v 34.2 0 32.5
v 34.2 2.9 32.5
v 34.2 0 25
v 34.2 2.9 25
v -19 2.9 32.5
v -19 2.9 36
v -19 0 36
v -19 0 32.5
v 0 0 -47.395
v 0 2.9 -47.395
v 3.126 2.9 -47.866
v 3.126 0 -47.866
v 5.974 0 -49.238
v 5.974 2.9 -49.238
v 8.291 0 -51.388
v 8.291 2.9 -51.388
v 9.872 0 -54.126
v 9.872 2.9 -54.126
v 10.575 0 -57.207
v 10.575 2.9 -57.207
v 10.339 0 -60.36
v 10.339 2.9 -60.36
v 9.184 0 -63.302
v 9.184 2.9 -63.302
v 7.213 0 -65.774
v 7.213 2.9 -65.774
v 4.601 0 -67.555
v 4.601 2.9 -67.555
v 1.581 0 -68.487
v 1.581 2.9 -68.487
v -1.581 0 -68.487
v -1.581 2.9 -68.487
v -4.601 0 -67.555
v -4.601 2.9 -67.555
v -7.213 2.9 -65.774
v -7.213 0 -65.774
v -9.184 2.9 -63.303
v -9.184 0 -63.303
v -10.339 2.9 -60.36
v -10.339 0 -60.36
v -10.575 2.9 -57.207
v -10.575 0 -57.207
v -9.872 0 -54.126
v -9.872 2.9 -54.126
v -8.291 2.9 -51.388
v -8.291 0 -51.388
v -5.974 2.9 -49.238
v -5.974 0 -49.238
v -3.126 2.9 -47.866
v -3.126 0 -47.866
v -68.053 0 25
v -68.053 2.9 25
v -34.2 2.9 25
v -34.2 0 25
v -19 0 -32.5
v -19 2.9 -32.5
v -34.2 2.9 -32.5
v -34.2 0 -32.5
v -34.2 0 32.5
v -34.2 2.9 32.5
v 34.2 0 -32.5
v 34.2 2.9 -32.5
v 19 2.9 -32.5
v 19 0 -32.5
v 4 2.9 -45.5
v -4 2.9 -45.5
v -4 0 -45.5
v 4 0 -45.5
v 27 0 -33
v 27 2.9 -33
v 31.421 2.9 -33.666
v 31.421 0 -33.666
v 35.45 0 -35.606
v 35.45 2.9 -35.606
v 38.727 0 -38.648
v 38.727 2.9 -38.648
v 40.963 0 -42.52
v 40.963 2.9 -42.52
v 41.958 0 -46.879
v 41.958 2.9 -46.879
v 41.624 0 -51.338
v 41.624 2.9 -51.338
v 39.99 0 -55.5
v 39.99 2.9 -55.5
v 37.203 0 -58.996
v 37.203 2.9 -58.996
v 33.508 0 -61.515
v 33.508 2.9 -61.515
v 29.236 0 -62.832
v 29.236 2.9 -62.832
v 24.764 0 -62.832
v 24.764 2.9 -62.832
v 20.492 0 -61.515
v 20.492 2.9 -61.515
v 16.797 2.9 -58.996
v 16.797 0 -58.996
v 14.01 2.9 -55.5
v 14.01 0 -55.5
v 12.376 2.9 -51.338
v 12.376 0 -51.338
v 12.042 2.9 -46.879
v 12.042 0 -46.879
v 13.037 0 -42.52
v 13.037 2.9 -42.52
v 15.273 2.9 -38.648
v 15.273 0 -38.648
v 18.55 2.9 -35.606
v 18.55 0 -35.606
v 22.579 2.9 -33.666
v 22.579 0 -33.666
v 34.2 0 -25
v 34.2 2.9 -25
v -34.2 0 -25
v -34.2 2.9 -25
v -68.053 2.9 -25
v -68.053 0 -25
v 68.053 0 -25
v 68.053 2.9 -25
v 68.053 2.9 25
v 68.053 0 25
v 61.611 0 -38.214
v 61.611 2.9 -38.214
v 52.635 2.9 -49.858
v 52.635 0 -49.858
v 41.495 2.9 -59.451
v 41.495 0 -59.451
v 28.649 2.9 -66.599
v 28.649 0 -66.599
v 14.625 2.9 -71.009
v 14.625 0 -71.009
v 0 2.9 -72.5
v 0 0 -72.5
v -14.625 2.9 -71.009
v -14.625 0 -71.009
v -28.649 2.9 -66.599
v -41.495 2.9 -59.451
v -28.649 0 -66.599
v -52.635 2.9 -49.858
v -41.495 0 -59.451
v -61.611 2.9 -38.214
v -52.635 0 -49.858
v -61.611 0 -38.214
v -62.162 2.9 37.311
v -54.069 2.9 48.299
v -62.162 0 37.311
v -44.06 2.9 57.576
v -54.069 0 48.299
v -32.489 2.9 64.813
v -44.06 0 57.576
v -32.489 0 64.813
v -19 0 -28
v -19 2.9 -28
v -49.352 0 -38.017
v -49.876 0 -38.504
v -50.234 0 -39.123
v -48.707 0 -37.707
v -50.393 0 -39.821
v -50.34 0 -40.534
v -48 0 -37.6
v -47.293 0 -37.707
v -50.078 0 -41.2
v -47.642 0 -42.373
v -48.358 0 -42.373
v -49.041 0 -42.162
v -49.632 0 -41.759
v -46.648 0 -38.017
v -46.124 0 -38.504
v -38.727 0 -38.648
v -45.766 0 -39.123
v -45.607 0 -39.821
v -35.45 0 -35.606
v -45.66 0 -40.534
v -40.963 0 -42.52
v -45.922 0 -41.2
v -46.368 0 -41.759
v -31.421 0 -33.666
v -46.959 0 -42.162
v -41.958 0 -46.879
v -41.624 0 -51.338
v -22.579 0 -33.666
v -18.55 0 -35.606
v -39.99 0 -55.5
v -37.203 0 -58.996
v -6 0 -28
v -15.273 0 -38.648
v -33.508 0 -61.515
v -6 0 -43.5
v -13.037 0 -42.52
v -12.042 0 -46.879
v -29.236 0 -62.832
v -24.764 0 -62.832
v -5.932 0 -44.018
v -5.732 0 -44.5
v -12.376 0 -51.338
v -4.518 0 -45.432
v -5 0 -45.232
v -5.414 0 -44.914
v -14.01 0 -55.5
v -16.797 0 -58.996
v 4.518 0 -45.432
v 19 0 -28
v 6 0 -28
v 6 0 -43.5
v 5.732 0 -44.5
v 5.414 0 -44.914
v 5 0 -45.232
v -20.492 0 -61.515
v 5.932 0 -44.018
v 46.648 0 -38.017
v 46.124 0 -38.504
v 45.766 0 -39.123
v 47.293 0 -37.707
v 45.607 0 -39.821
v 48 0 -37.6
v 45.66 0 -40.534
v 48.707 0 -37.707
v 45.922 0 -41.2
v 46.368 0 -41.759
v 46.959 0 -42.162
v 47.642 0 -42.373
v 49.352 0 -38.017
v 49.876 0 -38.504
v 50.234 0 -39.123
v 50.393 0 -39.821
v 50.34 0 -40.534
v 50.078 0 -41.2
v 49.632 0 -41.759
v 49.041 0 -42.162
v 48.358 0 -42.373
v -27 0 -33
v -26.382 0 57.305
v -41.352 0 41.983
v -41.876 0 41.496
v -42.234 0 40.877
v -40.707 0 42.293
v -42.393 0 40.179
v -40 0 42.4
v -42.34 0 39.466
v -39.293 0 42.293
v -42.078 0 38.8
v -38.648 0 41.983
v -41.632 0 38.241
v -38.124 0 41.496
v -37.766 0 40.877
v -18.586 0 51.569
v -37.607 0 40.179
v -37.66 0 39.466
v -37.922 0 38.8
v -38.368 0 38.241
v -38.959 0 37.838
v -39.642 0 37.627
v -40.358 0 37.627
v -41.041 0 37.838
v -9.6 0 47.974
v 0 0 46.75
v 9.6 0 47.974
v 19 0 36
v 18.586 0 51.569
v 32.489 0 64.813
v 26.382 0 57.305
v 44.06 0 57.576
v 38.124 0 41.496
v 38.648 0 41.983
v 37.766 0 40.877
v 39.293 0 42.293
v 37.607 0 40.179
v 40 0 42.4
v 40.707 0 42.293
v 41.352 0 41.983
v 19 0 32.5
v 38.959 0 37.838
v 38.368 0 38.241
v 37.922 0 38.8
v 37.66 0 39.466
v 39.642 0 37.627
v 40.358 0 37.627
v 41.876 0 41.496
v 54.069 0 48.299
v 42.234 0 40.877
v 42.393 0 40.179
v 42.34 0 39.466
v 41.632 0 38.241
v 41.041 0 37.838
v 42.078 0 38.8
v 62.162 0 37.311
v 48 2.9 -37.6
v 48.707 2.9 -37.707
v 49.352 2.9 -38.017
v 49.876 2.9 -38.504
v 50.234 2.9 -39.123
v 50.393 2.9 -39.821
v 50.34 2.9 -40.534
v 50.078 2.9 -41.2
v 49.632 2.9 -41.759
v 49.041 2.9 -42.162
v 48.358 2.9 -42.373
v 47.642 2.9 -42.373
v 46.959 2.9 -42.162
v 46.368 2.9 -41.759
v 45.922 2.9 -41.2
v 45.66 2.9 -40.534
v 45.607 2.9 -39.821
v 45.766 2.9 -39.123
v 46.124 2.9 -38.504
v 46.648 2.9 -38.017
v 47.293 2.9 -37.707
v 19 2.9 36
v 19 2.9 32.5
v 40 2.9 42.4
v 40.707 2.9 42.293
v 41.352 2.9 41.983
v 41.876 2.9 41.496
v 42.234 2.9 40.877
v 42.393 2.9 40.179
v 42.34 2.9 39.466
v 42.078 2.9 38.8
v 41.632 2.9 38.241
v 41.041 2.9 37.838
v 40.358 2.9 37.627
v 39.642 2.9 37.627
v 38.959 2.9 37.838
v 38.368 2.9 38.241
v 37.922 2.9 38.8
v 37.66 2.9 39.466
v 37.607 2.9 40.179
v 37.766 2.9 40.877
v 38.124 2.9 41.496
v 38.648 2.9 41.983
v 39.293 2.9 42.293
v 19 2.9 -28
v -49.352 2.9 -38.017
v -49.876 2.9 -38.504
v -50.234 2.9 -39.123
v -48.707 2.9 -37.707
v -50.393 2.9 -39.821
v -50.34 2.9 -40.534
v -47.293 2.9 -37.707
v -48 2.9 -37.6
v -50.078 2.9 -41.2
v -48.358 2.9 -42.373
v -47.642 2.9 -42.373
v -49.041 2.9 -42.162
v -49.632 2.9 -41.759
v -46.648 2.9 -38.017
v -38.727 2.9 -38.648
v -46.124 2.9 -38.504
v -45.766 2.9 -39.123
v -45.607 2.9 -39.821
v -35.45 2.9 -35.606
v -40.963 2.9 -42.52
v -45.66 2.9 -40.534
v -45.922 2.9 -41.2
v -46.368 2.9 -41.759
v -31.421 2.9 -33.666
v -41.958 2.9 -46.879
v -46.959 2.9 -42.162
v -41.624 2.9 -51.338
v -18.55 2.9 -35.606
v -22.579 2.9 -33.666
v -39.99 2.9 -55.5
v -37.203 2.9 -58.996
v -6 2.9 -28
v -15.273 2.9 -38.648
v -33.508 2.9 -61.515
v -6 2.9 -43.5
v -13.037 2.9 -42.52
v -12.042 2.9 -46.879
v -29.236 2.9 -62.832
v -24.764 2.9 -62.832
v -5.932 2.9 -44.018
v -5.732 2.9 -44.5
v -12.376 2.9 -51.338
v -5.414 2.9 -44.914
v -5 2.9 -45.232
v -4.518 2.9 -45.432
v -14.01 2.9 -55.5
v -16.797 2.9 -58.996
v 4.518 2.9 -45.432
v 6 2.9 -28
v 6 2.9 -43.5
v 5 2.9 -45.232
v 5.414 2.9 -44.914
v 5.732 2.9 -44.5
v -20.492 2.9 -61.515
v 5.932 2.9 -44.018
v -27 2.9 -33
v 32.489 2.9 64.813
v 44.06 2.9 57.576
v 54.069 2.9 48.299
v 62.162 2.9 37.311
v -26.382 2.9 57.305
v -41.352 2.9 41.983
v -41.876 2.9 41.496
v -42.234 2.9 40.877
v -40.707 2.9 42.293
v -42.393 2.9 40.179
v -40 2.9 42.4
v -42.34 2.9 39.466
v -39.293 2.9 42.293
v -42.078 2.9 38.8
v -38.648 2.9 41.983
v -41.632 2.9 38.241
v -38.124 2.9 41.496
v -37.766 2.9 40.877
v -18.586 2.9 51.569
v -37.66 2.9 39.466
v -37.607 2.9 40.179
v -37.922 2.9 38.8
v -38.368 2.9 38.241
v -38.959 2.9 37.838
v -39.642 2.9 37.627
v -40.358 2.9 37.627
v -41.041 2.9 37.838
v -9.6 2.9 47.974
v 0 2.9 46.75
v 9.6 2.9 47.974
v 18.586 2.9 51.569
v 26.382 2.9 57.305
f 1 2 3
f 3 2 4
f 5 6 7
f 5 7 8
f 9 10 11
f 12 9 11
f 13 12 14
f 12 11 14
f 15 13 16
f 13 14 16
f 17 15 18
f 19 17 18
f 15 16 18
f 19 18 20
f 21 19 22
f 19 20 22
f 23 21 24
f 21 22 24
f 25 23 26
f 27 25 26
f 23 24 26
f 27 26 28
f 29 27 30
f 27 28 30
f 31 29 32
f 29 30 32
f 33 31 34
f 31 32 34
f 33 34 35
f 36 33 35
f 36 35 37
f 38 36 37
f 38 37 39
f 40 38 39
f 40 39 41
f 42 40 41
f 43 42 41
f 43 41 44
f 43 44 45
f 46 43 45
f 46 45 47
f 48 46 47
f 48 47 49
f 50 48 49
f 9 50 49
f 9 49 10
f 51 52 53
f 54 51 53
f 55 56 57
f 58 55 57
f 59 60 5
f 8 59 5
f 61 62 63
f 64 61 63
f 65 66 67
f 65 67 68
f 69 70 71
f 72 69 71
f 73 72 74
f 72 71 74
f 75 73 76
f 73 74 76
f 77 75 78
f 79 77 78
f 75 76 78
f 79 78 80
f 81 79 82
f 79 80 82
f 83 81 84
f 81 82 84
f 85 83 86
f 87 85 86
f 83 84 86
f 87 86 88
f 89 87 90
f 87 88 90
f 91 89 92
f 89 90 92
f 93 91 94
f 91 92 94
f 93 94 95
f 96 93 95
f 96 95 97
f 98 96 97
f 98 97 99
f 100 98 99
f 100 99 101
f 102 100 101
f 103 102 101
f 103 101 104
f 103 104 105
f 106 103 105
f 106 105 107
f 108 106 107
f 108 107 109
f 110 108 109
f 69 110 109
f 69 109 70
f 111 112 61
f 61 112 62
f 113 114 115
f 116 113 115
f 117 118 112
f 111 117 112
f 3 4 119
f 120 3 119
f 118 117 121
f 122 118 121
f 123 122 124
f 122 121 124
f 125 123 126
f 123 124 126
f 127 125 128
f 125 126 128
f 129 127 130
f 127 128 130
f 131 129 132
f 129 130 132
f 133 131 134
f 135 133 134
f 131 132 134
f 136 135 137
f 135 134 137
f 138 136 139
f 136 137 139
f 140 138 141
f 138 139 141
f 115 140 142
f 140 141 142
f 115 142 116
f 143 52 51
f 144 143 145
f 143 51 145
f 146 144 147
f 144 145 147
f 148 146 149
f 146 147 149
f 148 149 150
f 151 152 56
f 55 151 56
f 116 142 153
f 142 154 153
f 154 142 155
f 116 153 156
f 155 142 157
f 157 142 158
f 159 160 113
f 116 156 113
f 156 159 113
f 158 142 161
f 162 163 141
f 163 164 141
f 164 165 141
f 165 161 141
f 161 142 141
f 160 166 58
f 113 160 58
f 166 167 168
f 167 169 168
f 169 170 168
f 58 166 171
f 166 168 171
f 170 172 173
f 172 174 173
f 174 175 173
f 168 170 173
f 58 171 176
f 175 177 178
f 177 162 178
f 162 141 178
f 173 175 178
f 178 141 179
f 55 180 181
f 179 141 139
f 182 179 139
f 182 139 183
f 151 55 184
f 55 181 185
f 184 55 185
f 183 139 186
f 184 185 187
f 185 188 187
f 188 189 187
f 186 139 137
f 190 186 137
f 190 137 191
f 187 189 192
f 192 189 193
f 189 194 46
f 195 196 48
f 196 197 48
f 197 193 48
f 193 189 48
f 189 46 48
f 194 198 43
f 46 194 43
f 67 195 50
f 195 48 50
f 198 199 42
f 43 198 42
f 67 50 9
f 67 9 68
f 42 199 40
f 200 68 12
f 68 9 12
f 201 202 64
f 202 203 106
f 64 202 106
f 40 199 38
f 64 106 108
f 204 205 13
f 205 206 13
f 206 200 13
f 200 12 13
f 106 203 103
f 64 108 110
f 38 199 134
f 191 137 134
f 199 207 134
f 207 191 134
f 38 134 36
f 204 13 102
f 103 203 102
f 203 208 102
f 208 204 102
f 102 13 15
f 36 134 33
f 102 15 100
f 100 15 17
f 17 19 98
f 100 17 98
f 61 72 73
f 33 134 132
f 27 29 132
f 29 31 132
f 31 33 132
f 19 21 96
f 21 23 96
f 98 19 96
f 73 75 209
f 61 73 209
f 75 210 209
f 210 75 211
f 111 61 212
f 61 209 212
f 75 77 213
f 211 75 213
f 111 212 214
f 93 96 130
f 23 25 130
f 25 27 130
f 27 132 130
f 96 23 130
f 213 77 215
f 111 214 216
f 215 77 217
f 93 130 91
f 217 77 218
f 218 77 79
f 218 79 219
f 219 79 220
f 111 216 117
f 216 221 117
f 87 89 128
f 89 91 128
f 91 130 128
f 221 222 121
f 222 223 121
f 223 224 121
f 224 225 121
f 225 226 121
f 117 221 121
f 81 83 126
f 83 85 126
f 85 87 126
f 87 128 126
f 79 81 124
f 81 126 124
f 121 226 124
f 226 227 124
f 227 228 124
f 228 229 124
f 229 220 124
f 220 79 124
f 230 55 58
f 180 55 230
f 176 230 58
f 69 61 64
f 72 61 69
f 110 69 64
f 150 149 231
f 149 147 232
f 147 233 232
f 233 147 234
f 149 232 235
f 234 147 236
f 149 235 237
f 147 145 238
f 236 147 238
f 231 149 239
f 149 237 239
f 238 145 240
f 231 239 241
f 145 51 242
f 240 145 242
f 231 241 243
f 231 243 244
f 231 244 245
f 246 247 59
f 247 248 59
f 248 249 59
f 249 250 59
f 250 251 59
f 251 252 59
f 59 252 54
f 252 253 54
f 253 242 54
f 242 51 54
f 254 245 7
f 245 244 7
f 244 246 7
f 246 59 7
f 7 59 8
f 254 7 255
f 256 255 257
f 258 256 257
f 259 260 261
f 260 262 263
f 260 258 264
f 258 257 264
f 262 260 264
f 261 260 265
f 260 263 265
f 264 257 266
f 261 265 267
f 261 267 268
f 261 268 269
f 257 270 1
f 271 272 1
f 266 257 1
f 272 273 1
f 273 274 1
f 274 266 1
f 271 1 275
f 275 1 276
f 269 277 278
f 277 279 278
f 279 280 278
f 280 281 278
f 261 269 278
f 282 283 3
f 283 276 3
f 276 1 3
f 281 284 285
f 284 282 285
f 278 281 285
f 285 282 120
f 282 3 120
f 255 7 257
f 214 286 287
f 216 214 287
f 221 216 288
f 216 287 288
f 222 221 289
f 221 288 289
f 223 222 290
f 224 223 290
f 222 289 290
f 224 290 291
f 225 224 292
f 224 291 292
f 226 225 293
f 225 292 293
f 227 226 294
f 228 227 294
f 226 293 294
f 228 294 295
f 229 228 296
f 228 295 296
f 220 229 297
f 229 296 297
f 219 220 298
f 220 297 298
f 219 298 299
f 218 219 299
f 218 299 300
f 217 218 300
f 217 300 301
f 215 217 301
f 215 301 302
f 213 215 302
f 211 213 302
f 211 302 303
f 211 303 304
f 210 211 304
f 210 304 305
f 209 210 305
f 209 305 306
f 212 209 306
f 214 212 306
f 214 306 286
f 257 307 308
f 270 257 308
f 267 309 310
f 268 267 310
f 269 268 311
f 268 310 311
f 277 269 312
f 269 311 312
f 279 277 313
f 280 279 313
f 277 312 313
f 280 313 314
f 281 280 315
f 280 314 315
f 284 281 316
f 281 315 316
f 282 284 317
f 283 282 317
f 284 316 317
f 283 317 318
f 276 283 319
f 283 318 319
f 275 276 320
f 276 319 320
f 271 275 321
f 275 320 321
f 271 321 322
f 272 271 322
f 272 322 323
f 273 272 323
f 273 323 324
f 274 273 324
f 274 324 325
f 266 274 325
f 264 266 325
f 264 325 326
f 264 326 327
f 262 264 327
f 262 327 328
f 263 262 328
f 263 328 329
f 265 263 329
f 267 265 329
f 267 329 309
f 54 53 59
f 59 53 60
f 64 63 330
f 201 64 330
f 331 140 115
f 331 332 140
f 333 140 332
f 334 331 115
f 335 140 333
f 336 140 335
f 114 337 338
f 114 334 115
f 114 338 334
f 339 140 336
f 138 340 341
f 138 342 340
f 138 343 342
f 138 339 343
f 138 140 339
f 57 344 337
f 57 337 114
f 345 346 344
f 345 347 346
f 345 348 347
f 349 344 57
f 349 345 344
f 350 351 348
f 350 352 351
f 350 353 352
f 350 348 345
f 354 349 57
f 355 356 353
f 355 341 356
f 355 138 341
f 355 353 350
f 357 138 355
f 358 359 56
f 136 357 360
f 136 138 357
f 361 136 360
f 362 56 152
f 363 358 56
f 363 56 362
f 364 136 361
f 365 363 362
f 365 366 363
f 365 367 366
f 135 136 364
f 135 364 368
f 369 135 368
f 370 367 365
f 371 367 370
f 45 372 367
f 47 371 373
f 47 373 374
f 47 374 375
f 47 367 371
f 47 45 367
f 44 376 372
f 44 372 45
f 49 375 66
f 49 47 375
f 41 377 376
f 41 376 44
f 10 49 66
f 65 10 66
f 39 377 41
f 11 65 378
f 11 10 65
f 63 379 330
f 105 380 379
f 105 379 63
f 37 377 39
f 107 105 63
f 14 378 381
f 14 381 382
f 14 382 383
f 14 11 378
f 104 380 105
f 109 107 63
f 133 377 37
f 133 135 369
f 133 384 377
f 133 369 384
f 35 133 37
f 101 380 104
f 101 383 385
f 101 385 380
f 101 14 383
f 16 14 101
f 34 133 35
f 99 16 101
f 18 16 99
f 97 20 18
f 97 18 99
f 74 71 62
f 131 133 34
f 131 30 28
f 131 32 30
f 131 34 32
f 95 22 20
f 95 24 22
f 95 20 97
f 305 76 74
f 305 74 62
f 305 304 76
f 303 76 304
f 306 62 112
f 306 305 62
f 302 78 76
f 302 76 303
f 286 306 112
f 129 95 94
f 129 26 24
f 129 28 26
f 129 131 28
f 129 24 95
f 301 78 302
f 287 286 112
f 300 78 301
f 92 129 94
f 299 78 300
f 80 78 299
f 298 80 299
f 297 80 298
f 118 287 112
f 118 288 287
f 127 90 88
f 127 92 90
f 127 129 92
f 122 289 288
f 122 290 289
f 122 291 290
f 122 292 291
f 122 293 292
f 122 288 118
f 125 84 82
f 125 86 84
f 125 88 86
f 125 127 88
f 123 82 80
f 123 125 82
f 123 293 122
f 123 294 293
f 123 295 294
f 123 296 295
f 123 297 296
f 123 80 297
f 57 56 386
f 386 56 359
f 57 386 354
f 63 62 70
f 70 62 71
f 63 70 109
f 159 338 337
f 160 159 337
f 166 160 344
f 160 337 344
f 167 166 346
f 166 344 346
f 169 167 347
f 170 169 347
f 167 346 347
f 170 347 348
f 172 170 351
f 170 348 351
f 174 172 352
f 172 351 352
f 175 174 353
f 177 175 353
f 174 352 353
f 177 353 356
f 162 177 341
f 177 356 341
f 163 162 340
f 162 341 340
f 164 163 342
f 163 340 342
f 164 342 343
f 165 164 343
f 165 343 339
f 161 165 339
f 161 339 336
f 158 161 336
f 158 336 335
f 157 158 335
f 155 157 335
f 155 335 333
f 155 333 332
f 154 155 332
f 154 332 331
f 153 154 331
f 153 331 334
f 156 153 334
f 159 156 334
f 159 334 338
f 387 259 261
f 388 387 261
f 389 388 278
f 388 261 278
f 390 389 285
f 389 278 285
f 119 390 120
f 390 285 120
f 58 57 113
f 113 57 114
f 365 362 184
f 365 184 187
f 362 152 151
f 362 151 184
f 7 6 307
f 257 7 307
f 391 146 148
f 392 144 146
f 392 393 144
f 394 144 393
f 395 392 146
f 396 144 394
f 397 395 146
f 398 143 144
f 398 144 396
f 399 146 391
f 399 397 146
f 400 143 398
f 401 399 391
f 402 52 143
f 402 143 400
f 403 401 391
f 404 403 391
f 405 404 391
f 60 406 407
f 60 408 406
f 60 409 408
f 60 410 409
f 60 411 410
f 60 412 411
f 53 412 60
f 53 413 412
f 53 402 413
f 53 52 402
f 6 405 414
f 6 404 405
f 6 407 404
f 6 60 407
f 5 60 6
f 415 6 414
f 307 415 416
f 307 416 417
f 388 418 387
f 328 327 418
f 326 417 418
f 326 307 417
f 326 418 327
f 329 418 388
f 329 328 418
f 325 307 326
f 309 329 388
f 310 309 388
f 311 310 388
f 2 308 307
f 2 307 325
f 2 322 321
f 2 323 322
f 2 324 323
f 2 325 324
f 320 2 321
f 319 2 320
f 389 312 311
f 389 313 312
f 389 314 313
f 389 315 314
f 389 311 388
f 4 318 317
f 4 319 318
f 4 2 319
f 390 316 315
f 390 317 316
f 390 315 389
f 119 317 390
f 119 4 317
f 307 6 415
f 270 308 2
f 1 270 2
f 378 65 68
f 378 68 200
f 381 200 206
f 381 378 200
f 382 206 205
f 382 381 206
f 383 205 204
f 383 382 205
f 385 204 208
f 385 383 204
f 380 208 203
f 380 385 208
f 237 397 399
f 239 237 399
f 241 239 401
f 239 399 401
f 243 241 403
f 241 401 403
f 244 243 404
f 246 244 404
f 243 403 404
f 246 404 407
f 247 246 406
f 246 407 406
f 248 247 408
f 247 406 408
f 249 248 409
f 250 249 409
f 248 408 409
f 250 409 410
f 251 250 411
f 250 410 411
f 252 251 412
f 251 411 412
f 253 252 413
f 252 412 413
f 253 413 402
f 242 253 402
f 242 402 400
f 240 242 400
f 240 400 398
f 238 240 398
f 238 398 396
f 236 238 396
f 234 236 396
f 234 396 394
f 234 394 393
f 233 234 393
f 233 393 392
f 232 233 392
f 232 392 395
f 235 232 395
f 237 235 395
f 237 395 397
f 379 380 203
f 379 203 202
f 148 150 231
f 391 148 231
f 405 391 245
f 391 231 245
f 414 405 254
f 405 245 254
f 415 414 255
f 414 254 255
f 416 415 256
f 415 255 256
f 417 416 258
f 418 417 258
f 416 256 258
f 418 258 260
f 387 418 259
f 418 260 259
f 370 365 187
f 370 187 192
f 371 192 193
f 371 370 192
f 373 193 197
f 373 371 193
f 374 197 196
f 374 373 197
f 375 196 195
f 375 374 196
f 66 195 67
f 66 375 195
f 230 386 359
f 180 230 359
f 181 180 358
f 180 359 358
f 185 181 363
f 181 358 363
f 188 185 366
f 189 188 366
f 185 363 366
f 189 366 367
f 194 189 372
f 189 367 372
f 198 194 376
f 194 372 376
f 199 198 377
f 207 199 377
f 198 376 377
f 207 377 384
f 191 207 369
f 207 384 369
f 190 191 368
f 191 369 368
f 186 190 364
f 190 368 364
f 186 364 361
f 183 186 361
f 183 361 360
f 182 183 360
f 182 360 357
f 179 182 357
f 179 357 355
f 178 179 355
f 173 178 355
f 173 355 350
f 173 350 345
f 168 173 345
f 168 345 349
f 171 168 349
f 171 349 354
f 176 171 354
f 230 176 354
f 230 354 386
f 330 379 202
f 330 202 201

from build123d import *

# Parameters (mm, degrees)
BOSS_EXTRUDE1_DEPTH  = 2.9
SOLENOID_PLACEMENT_W = 38
SOLENOID_PLACEMENT_H = 64
CUT_EXTRUDE1_DEPTH   = 103.571487266
SKETCH7_R            = 15
CUT_EXTRUDE6_DEPTH   = 103.571487266
SKETCH8_R            = 2.4
CUT_EXTRUDE7_DEPTH   = 103.571487266
CUT_EXTRUDE3_DEPTH   = 103.571487266
CUT_EXTRUDE8_DEPTH   = 100.478188564
SKETCH10_R           = 10.605
CUT_EXTRUDE9_DEPTH   = 100.478188564


with BuildPart() as part:
    # Sketch1 → Boss-Extrude1 (new body)
    with BuildSketch(Plane(origin=(0, 0, 0), x_dir=(1, 0, 0), z_dir=(0, 1, 0))):
        with BuildLine():
            ThreePointArc((32.48910875, -64.812867647), (0, 72.5), (-32.48910875, -64.812867647))
            ThreePointArc((-32.48910875, -64.812867647), (0, -46.75), (32.48910875, -64.812867647))
        make_face()
    extrude(amount=BOSS_EXTRUDE1_DEPTH)

    # solenoid placement → Cut-Extrude1 (cut, through all)
    with BuildSketch(Plane(origin=(0, 2.9, 0), x_dir=(1, 0, 0), z_dir=(0, 1, 0))):
        with Locations((0, -4)):
            Rectangle(SOLENOID_PLACEMENT_W, SOLENOID_PLACEMENT_H)
    extrude(amount=-CUT_EXTRUDE1_DEPTH, mode=Mode.SUBTRACT)

    # Sketch7 → Cut-Extrude6 (cut, through all)
    with BuildSketch(Plane(origin=(0, 2.9, 0), x_dir=(1, 0, 0), z_dir=(0, 1, 0))):
        with Locations(Location((27, 48, 0), (0, 0, 270))):
            Circle(SKETCH7_R)
        with Locations(Location((-27, 48, 0), (0, 0, 270))):
            Circle(SKETCH7_R)
    extrude(amount=-CUT_EXTRUDE6_DEPTH, mode=Mode.SUBTRACT)

    # Sketch8 → Cut-Extrude7 (cut, through all)
    with BuildSketch(Plane(origin=(0, 2.9, 0), x_dir=(1, 0, 0), z_dir=(0, 1, 0))):
        with Locations(Location((40, -40, 0), (0, 0, 270))):
            Circle(SKETCH8_R)
        with Locations(Location((-40, -40, 0), (0, 0, 270))):
            Circle(SKETCH8_R)
        with Locations(Location((48, 40, 0), (0, 0, 270))):
            Circle(SKETCH8_R)
        with Locations(Location((-48, 40, 0), (0, 0, 270))):
            Circle(SKETCH8_R)
    extrude(amount=-CUT_EXTRUDE7_DEPTH, mode=Mode.SUBTRACT)

    # Sketch3 → Cut-Extrude3 (cut, through all)
    with BuildSketch(Plane(origin=(0, 2.9, 0), x_dir=(1, 0, 0), z_dir=(0, 1, 0))):
        with BuildLine():
            Line((-34.2, -32.5), (-22.2, -32.5))
            Line((-22.2, -32.5), (-19, -32.5))
            Line((-19, -32.5), (-19, 32.5))
            Line((-19, 32.5), (-22.2, 32.5))
            Line((-22.2, 32.5), (-34.2, 32.5))
            Line((-34.2, 32.5), (-34.2, 25))
            Line((-34.2, 25), (-68.053287944, 25))
            ThreePointArc((-68.053287944, 25), (-72.5, 0), (-68.053287944, -25))
            Line((-68.053287944, -25), (-34.2, -25))
            Line((-34.2, -25), (-34.2, -32.5))
        make_face()
        with BuildLine():
            Line((19, 32.5), (19, -32.5))
            Line((19, -32.5), (22.2, -32.5))
            Line((22.2, -32.5), (34.2, -32.5))
            Line((34.2, -32.5), (34.2, -25))
            Line((34.2, -25), (68.053287944, -25))
            ThreePointArc((68.053287944, -25), (72.5, 0), (68.053287944, 25))
            Line((68.053287944, 25), (34.2, 25))
            Line((34.2, 25), (34.2, 32.5))
            Line((34.2, 32.5), (22.2, 32.5))
            Line((22.2, 32.5), (19, 32.5))
        make_face()
    extrude(amount=-CUT_EXTRUDE3_DEPTH, mode=Mode.SUBTRACT)


with BuildPart() as cut_extrude3_piece_1:
    # of the separate pieces the step leaves, piece 1, a body of its own (cut_extrude3_pieces)
    add(part.part.solids().sort_by_distance((68.053287944, 0, -25))[0])

    # Sketch9 → Cut-Extrude8 (cut, through all)
    with BuildSketch(Plane(origin=(0, 2.9, 0), x_dir=(1, 0, 0), z_dir=(0, 1, 0))):
        with BuildLine():
            Line((6, 43.5), (6, 28))
            Line((6, 28), (-6, 28))
            Line((-6, 28), (-6, 43.5))
            ThreePointArc((-6, 43.5), (-5.414213562, 44.914213562), (-4, 45.5))
            Line((-4, 45.5), (4, 45.5))
            ThreePointArc((4, 45.5), (5.414213562, 44.914213562), (6, 43.5))
        make_face()
    extrude(amount=-CUT_EXTRUDE8_DEPTH, mode=Mode.SUBTRACT)

    # Sketch10 → Cut-Extrude9 (cut, through all)
    with BuildSketch(Plane(origin=(0, 2.9, 0), x_dir=(1, 0, 0), z_dir=(0, 1, 0))):
        with Locations(Location((0, 58, 0), (0, 0, 270))):
            Circle(SKETCH10_R)
    extrude(amount=-CUT_EXTRUDE9_DEPTH, mode=Mode.SUBTRACT)


with BuildPart() as cut_extrude3_piece_2:
    # of the separate pieces the step leaves, piece 2, a body of its own (cut_extrude3_pieces)
    add(part.part.solids().sort_by_distance((32.48910875, 0, 64.812867647))[0])


solid = Compound([cut_extrude3_piece_1.part, cut_extrude3_piece_2.part])
